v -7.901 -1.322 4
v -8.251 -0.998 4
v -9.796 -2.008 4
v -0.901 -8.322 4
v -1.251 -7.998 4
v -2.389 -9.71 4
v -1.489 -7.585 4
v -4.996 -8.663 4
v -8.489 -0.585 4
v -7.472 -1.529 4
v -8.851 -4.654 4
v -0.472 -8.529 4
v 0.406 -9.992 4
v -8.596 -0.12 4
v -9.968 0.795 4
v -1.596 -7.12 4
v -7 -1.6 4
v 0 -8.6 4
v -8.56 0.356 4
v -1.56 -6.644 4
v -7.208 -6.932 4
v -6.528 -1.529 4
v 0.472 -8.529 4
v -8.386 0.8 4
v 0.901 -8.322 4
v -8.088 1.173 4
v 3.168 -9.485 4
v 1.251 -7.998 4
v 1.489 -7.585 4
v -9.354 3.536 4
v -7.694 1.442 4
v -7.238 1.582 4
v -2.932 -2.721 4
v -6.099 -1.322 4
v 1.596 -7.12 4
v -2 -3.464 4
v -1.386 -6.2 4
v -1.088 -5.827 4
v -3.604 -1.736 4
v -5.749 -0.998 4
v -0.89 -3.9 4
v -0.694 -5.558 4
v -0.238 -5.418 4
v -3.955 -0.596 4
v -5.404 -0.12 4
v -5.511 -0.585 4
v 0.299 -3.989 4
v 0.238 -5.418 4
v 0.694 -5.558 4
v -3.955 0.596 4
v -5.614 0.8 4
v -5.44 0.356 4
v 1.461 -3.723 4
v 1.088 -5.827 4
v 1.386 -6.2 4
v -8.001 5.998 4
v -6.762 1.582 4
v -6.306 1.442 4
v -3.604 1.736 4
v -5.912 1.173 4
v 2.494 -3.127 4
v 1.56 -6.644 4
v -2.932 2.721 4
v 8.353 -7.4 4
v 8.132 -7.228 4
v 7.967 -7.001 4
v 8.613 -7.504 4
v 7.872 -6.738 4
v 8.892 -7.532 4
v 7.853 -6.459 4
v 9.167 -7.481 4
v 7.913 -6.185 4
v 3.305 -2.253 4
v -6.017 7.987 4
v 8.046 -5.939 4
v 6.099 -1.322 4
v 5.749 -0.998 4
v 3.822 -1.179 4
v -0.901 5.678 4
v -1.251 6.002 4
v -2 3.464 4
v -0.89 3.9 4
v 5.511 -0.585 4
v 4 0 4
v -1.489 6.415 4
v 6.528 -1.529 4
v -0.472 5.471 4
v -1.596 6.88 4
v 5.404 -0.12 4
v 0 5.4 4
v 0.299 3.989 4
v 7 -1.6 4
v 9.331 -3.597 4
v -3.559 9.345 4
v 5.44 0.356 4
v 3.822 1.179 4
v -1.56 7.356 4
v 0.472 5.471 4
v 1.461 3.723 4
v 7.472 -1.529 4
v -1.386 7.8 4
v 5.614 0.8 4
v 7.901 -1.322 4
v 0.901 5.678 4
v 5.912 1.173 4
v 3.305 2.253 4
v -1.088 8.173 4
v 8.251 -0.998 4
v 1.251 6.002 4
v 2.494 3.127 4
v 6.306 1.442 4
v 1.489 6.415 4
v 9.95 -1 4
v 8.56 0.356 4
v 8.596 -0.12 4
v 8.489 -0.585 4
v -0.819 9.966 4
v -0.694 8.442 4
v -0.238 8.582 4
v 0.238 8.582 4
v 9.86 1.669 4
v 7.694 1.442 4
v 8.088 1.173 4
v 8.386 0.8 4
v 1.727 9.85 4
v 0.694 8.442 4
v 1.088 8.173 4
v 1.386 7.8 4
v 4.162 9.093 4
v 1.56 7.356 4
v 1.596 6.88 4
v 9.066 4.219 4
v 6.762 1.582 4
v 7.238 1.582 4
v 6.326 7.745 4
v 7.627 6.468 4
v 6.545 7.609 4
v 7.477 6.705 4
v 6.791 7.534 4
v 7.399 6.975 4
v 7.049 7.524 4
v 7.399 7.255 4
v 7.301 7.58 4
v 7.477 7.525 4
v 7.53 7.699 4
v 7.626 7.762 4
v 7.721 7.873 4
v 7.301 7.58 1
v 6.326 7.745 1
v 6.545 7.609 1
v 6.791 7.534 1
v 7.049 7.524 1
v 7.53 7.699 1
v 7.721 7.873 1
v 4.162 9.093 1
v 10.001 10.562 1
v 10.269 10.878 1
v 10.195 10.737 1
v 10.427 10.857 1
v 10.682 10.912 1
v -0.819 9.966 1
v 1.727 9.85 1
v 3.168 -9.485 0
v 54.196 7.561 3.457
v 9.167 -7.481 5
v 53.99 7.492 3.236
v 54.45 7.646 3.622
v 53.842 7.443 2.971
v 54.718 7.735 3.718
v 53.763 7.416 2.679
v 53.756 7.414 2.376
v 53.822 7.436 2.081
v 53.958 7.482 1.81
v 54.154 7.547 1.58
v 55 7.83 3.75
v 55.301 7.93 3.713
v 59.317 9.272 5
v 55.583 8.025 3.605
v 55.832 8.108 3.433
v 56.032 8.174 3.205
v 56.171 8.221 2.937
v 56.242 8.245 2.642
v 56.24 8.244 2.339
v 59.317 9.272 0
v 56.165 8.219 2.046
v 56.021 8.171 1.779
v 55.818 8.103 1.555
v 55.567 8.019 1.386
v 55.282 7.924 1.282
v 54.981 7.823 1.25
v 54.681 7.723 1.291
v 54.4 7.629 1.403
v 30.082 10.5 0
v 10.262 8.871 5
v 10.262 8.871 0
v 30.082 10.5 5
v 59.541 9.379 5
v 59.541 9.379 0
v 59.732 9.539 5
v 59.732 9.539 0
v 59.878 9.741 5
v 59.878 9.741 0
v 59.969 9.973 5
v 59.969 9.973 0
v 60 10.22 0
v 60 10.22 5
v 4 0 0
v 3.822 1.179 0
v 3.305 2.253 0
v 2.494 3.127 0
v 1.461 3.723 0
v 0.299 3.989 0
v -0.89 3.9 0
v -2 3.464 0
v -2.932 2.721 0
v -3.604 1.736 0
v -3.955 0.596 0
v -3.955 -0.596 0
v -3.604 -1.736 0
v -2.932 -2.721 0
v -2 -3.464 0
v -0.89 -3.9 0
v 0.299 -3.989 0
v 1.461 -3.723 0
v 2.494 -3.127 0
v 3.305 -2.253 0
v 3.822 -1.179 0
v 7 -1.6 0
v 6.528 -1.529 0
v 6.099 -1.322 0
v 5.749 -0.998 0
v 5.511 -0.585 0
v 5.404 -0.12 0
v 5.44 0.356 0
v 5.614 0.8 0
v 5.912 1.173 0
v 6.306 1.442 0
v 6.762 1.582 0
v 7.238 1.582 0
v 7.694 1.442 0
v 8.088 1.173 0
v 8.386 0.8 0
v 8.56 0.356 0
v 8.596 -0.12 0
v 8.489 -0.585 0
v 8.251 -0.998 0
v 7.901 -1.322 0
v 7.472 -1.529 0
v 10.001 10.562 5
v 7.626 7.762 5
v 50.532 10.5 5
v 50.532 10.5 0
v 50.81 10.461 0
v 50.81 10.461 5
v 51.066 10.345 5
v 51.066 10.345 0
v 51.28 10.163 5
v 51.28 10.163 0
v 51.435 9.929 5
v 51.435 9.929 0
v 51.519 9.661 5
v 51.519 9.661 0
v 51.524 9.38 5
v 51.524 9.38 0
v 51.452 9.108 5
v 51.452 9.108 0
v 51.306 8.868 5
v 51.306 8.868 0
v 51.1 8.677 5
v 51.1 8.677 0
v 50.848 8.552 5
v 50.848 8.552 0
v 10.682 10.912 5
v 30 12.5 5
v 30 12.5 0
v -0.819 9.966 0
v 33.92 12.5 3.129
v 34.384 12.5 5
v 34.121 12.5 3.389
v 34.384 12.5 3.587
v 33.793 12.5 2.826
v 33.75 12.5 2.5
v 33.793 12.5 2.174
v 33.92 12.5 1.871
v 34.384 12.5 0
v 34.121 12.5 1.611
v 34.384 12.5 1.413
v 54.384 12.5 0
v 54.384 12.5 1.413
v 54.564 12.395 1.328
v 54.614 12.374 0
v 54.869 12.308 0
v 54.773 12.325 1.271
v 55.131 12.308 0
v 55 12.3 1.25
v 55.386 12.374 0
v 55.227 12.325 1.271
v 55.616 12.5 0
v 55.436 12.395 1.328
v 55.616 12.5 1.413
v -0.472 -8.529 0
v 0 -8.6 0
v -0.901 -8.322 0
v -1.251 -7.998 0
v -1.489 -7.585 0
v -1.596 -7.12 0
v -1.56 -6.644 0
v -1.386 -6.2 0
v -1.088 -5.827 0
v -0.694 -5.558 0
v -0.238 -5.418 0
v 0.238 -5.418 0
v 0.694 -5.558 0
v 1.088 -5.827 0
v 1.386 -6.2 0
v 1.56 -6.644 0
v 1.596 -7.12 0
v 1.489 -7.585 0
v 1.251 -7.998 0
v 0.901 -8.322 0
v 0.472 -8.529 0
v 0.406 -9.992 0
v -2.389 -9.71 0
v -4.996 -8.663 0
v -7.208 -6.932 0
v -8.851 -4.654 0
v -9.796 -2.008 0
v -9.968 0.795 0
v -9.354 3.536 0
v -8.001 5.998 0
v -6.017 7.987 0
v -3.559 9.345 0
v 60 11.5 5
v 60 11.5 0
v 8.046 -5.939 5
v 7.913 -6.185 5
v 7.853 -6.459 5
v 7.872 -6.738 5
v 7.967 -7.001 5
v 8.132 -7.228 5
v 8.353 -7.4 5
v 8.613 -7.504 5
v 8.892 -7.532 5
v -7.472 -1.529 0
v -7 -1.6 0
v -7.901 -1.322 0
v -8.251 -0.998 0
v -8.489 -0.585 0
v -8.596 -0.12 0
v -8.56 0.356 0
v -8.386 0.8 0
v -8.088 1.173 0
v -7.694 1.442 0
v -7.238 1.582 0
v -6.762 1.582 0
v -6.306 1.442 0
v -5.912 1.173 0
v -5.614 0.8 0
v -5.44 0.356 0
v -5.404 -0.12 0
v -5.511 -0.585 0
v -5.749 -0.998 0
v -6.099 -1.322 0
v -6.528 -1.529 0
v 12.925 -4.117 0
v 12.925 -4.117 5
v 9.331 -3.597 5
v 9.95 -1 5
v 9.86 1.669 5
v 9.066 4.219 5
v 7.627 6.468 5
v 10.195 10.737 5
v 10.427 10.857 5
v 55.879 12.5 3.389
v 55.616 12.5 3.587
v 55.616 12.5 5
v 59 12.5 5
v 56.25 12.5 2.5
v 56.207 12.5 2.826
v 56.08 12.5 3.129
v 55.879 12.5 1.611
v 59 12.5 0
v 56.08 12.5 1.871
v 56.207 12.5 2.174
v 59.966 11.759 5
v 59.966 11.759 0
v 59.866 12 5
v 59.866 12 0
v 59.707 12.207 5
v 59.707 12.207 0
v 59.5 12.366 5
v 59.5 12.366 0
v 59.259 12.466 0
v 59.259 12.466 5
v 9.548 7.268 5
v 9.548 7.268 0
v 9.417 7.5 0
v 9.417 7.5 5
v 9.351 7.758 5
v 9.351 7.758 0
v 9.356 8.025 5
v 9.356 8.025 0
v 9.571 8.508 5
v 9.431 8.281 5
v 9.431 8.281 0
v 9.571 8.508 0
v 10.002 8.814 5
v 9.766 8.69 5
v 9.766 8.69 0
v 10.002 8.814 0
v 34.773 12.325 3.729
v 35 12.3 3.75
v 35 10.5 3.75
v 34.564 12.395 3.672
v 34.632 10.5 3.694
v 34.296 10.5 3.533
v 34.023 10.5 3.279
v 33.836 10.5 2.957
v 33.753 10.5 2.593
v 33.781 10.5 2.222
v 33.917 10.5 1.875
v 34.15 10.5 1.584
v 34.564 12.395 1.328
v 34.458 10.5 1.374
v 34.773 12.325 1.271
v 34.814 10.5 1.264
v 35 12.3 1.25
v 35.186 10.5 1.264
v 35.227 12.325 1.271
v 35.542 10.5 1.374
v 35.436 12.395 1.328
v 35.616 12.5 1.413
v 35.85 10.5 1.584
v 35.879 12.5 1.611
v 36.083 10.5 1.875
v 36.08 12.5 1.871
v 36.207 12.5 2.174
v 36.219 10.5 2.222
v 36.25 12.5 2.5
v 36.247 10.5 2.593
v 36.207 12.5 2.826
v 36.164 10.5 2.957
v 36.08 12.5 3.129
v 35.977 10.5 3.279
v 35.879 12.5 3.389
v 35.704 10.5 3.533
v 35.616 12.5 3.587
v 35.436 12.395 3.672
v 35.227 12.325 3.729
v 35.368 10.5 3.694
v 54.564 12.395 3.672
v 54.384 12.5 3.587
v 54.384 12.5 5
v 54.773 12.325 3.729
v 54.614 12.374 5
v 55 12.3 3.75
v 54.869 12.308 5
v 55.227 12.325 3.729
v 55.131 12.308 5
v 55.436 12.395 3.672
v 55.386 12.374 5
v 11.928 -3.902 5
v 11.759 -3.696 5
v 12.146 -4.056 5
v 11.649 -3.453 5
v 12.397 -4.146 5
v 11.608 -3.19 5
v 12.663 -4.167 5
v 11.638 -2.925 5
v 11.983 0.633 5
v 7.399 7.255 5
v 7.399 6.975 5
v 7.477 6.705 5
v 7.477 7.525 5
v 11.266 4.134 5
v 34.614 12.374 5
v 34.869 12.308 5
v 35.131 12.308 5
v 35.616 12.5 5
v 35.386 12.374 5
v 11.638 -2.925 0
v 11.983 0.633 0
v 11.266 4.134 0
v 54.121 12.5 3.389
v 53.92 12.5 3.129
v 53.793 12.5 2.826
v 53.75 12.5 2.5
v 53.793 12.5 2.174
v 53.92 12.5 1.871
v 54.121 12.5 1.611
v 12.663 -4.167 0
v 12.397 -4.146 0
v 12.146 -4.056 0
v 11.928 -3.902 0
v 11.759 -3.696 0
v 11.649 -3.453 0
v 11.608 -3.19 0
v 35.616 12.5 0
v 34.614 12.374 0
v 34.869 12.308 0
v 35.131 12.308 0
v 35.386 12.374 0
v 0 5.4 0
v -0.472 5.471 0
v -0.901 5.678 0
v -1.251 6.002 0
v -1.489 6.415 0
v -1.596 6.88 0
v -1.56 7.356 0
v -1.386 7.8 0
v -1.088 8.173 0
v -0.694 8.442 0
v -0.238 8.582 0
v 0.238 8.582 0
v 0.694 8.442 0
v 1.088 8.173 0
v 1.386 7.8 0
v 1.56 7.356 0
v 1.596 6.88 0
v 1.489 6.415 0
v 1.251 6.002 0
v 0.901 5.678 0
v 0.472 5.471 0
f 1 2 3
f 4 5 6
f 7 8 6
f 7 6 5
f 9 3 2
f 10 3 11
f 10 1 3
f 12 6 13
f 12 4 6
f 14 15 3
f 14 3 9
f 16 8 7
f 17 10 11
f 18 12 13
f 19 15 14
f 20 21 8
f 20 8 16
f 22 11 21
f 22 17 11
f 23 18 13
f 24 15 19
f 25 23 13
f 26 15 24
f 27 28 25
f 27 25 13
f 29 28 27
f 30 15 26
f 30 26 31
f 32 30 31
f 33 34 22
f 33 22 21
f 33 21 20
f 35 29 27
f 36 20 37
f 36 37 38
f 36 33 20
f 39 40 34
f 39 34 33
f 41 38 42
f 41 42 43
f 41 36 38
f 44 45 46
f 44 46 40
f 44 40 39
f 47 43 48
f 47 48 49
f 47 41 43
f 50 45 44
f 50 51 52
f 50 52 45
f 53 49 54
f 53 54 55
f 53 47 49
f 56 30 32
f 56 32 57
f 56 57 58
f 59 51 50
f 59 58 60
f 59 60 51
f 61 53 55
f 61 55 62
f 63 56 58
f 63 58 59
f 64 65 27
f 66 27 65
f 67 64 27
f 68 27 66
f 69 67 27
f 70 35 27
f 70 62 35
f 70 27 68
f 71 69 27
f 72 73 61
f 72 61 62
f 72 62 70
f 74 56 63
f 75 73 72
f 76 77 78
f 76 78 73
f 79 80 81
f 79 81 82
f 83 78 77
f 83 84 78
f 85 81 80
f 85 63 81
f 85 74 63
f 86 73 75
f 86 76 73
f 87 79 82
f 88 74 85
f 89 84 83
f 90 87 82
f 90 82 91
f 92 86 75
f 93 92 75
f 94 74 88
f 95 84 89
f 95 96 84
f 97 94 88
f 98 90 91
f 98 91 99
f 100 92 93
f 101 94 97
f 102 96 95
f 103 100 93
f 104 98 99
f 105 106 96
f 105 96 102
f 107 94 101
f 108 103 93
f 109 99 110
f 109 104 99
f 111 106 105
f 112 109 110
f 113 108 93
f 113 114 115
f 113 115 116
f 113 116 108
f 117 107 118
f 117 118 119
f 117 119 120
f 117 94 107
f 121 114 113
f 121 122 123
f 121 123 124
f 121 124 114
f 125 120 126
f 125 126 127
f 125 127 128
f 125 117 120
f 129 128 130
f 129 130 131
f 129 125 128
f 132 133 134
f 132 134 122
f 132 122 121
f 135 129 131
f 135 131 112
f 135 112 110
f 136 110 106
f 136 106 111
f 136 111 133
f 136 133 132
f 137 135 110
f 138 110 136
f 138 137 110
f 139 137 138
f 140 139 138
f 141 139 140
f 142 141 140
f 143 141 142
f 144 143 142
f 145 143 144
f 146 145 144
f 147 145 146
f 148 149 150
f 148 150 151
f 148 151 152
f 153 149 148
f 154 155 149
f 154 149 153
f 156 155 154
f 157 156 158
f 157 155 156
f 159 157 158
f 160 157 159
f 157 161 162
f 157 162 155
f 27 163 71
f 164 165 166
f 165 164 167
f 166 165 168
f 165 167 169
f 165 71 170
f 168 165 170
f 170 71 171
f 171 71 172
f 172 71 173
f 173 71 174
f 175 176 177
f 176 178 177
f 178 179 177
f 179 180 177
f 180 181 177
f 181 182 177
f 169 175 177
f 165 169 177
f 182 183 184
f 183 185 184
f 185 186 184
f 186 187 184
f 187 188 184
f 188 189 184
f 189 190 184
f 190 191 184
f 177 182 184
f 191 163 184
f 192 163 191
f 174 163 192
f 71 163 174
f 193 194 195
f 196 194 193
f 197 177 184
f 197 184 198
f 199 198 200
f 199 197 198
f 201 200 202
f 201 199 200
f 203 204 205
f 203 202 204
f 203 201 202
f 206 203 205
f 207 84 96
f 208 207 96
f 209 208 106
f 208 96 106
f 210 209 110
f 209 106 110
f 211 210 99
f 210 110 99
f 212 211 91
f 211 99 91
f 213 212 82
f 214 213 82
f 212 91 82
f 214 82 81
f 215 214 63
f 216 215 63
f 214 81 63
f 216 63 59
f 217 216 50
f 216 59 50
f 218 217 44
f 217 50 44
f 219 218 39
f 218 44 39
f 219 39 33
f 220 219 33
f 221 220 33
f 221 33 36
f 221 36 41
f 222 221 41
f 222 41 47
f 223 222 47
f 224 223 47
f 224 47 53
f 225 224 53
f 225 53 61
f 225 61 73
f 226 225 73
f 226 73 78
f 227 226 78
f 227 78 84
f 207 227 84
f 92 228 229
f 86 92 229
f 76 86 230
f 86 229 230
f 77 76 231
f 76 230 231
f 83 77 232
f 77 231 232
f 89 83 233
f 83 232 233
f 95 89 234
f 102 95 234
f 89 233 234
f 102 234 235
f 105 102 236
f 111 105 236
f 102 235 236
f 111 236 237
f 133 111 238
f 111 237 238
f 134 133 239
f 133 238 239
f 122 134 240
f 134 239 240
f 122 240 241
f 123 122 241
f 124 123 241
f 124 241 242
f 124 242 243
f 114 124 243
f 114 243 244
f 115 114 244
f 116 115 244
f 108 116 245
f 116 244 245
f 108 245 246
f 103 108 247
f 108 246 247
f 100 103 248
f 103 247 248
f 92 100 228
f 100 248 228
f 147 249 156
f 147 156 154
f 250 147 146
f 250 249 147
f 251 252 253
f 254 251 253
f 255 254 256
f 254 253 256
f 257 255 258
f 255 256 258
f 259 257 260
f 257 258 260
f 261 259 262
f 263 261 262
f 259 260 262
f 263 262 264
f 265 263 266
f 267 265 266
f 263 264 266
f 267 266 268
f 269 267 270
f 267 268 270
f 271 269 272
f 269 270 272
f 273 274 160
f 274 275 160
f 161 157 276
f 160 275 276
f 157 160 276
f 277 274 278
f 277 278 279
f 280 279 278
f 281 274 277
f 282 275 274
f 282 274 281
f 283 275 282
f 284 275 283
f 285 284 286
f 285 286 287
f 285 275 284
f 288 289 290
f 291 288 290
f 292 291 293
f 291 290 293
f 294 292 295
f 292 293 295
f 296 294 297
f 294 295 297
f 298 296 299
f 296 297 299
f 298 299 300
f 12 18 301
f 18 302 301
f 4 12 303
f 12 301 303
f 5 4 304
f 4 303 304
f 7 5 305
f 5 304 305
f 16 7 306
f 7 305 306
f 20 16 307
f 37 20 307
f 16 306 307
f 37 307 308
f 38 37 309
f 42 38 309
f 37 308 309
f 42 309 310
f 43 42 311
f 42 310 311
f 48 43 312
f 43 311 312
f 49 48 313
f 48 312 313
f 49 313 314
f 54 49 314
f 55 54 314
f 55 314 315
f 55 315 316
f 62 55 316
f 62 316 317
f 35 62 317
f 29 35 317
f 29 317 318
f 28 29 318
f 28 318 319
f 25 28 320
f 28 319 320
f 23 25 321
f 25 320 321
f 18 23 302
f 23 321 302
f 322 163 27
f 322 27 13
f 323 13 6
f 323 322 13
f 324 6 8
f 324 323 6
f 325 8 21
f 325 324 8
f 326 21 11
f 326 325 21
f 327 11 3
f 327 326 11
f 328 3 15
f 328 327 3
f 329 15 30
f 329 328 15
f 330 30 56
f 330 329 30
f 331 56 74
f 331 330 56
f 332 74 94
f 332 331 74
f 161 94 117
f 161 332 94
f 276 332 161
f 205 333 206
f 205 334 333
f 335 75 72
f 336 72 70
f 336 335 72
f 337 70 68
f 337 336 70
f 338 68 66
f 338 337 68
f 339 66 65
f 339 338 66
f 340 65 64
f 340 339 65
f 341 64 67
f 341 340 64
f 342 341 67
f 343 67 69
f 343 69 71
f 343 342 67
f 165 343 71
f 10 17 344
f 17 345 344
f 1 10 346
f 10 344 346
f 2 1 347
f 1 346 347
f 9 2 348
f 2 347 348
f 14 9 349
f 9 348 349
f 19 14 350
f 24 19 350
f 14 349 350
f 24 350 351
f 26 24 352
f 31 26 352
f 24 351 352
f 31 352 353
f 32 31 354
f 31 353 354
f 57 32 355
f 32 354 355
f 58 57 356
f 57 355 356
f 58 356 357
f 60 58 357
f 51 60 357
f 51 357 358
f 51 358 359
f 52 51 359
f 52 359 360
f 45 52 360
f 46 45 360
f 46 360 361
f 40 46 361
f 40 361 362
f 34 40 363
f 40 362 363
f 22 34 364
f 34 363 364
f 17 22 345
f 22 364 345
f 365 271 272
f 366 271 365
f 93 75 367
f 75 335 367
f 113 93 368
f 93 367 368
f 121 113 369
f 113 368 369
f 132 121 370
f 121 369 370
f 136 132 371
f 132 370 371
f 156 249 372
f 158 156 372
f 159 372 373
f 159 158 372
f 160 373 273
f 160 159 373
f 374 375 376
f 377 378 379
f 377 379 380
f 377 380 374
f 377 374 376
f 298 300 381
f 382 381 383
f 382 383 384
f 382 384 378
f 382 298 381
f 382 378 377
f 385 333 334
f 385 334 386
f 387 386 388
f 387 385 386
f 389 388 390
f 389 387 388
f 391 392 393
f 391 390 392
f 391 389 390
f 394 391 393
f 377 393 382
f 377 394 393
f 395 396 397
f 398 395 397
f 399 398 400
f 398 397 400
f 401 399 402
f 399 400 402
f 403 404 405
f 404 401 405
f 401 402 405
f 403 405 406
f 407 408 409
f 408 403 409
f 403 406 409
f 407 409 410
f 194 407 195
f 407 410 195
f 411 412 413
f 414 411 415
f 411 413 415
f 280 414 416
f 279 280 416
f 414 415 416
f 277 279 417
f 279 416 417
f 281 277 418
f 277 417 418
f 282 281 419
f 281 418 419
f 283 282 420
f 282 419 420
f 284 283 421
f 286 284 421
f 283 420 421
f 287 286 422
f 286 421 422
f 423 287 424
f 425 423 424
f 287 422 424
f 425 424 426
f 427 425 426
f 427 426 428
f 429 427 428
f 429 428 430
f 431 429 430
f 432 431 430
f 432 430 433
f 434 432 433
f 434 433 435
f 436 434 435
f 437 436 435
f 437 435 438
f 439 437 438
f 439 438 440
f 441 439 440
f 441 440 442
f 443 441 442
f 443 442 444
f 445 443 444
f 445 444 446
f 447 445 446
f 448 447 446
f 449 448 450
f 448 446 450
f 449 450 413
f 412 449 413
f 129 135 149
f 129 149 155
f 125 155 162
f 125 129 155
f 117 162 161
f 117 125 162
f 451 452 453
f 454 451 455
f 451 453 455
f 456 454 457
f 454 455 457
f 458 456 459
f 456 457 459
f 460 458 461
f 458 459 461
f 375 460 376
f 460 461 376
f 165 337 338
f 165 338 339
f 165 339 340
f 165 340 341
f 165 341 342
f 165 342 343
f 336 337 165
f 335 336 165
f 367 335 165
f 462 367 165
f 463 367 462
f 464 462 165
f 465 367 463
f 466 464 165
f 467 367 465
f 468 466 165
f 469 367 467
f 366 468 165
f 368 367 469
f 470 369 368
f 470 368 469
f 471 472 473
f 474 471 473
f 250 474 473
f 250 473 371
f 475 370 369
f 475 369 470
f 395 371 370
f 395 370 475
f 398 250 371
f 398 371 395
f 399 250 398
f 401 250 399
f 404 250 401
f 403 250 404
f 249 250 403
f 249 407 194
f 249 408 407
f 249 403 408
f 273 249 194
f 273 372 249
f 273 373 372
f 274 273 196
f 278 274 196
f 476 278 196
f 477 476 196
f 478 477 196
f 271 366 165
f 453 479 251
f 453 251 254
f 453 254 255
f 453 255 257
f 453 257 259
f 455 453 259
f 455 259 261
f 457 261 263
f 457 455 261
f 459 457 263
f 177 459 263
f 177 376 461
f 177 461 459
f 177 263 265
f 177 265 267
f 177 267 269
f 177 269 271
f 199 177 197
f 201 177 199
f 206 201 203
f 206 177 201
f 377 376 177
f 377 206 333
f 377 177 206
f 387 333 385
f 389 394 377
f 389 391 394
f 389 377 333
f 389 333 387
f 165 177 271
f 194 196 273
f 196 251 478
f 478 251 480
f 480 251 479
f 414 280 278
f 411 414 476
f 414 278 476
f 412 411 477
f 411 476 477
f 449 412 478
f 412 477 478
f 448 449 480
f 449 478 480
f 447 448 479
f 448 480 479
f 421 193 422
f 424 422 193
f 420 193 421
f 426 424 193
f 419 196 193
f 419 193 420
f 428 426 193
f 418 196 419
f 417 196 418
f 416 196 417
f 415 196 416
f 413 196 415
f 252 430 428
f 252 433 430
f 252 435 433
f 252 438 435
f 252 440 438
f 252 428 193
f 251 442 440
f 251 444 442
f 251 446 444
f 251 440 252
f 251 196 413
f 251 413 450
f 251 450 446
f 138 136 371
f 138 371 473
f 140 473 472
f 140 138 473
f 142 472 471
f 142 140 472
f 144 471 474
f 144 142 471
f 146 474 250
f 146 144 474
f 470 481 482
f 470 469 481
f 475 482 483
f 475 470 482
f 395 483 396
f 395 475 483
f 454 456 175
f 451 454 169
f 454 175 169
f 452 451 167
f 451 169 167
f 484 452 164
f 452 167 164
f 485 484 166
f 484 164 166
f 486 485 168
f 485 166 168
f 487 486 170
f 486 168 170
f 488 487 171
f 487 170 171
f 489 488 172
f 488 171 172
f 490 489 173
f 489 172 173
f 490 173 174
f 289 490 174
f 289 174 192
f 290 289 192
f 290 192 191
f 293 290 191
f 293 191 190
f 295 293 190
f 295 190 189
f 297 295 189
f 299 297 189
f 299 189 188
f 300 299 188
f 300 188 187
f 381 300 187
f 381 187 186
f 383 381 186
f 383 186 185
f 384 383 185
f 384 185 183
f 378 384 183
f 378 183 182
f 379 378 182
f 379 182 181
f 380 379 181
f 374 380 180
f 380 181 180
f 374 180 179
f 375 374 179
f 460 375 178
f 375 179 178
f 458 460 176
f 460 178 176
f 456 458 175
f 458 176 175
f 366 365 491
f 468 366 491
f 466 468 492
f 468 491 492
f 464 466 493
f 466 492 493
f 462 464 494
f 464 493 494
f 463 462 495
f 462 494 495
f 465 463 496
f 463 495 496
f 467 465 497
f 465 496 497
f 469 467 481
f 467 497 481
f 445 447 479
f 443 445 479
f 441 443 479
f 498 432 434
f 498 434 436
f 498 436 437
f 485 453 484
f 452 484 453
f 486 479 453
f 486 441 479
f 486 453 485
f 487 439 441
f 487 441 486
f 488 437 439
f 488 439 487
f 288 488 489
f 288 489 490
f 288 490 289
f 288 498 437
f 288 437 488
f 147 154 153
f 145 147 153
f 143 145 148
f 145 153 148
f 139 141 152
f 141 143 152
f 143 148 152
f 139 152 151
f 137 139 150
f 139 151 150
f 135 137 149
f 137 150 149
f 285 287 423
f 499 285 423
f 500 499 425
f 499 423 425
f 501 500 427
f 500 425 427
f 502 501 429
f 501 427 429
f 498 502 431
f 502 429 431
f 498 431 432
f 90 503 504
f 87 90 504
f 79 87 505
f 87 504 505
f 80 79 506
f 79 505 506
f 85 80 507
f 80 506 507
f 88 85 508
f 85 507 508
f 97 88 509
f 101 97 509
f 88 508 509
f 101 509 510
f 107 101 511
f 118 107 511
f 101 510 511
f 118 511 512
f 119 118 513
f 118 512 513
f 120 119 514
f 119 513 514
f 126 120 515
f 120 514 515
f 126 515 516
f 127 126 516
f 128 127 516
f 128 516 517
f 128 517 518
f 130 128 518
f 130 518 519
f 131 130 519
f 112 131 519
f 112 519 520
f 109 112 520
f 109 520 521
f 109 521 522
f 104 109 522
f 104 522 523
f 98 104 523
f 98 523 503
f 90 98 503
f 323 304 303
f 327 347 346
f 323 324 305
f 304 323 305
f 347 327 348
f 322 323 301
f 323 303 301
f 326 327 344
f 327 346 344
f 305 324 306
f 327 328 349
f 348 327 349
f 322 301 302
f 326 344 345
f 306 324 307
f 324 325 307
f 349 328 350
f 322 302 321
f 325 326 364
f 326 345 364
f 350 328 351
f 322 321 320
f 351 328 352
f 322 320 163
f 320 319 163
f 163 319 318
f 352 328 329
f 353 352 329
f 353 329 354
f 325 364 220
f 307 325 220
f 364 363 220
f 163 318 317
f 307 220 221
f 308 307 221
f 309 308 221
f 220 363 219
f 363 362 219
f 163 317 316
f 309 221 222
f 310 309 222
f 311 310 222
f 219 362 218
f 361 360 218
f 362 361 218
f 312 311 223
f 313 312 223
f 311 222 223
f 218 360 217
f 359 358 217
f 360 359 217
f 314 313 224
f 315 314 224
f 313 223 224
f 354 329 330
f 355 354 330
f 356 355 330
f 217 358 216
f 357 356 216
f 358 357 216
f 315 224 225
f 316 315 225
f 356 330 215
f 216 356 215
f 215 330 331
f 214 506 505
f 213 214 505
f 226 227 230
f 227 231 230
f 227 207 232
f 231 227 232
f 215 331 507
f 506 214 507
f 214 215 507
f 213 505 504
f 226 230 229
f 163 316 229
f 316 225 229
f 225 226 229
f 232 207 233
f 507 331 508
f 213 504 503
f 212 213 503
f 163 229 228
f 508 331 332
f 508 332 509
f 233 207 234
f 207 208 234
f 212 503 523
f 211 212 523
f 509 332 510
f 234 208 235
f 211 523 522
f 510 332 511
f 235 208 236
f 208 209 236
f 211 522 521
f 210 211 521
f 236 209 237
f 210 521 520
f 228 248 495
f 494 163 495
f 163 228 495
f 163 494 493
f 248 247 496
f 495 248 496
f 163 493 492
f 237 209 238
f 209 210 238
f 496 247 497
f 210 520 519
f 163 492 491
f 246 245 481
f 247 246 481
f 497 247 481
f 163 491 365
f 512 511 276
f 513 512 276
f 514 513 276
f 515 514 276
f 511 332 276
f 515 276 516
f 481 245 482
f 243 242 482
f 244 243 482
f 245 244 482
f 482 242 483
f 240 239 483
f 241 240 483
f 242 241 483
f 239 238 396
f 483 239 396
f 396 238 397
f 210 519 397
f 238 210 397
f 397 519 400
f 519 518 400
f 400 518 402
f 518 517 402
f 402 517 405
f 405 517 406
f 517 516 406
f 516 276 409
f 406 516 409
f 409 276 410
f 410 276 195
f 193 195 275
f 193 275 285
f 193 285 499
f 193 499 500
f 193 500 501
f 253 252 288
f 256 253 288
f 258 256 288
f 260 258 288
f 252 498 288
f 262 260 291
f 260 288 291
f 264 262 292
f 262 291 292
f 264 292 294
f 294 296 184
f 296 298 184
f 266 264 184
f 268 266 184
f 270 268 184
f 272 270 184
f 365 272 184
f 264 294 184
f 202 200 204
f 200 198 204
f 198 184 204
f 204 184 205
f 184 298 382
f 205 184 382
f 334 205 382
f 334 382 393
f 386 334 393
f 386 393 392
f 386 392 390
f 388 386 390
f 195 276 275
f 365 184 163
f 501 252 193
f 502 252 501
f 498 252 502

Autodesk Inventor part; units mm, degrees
ref_plane "YZ Plane" through (0, 0, 0) normal (1, 0, 0) x (0, 1, 0)
ref_plane "XZ Plane" through (0, 0, 0) normal (0, 1, 0) x (-1, 0, 0)
ref_plane "XY Plane" through (0, 0, 0) normal (0, 0, 1) x (1, 0, 0)
sketch "スケッチ1" plane through (0, 0, 0) normal (0, 0, 1) x (1, 0, 0)
  circle A0 centre (0, 0) radius 10
  line L0 (30, 12.5) -> (60, 12.5)
  line L1 (60, 12.5) -> (60, 9.5)
  line L2 (60, 9.5) -> (30, 9.5)
  line L3 (30, 9.5) -> (30, 12.5)
  line L4 (30, 12.5) -> (-0.819325, 9.966379)
  line L5 (3.168424, -9.484782) -> (60, 9.5)
  dimension "d0" = 20
  dimension "d1" = 30
  dimension "d2" = 3
  dimension "d3" = 12.5
  dimension "d4" = 60
extrude "プレート1" add sketch "スケッチ1" along normal blind 5
sketch "スケッチ2" plane through (0, 0, 5) normal (0, 0, 1) x (1, 0, 0)
  arc A0 (-0.819325, 9.966379) -> (3.168424, -9.484782) centre (0, 0) ccw
  line L0 (30, 12.5) -> (-0.819325, 9.966379)
  circle A1 centre (0, 0) radius 10
  point P0 (3.168424, -9.484782)
extrude "押し出し1" cut sketch "スケッチ2" against normal blind 1
sketch "スケッチ3" plane through (0, 0, 4) normal (0, 0, 1) x (1, 0, 0)
  circle A0 centre (0, 0) radius 7 construction
  line L0 (0, -7) -> (7, 0) construction
  line L1 (7, 0) -> (0, 7) construction
  line L2 (0, 7) -> (-7, 0) construction
  line L3 (-7, 0) -> (0, -7) construction
  line L4 (0, -7) -> (0, 7) construction
  line L5 (7, 0) -> (-7, 0) construction
  dimension "d8" = 14
hole "穴1" at (0, 7, 4) at (7, 0, 4) at (0, -7, 4) at (-7, 0, 4) direction (0, 0, -1) diameter 3.2 end through all
sketch "スケッチ4" plane through (0, 0, 4) normal (0, 0, 1) x (1, 0, 0)
  circle A0 centre (0, 0) radius 4
  dimension "d16" = 8
extrude "押し出し2" cut sketch "スケッチ4" against normal through all
sketch "スケッチ6" plane through (0, 0, 5) normal (0, 0, 1) x (1, 0, 0)
  line L0 (60, 9.5) -> (3.168424, -9.484782)
  line L1 (60, 12.5) -> (60, 9.5)
  line L2 (30, 12.5) -> (60, 12.5)
  line L3 (-0.819325, 9.966379) -> (30, 12.5)
  arc A0 (3.168424, -9.484782) -> (-0.819325, 9.966379) centre (0, 0) ccw
  line L4 (30.08207, 10.5) -> (56.681246, 10.5)
  line L5 (56.681246, 10.5) -> (11.018186, -4.753901)
  arc A1 (11.018186, -4.753901) -> (8.258741, 8.705929) centre (0, 0) ccw
  line L6 (8.258741, 8.705929) -> (30.08207, 10.5)
  dimension "d28" = 2
extrude "押し出し4" cut sketch "スケッチ6" against normal through all contours L4 L5 A1 L6
sketch "スケッチ5" plane through (0, 0, 5) normal (0, 0, 1) x (1, 0, 0)
  line L0 (30, 12.5) -> (60, 12.5) projected
  circle A0 centre (35, 13.35) radius 1.05
  circle A1 centre (55, 13.35) radius 1.05
  line L1 (60, 12.5) -> (60, 9.5) projected
  point P0 (0, 0)
  dimension "d20" = 2.1
  dimension "d21" = 2.1
  dimension "d22" = 5
  dimension "d23" = 5
  dimension "d24" = 0.85
  dimension "d25" = 0.85
extrude "押し出し3" cut sketch "スケッチ5" against normal through all
fillet "フィレット2" radius 1 4 edges at (11.0182, -4.7539, 2.5) (8.2587, 8.7059, 2.5) (56.6812, 10.5, 2.5) (30.0821, 10.5, 2.5)
sketch "スケッチ7" plane through (35.616441, 12.5, 0) normal (0, 1, 0) x (1, 0, 0)
  line L0 (18.767117, -5) -> (18.767117, 0)
  line L1 (20, -5) -> (18.767117, -5)
  line L2 (20, 0) -> (20, -5)
  line L3 (18.767117, 0) -> (20, 0)
  line L4 (-1.232883, -5) -> (-1.232883, 0)
  line L5 (0, -5) -> (-1.232883, -5)
  line L6 (0, 0) -> (0, -5)
  line L7 (-1.232883, 0) -> (0, 0)
  point P0 (-35.616441, 0)
  point P1 (-0.616441, -2.5)
  point P2 (19.383559, -2.5)
  point P3 (19.383559, -5)
  point P4 (-0.616441, -5)
  point P5 (-1.232883, -2.5)
  point P6 (18.767117, -2.5)
hole "穴2" at (35, 12.5, 2.5) at (55, 12.5, 2.5) direction (0, -1, 0) diameter 2.5 depth 8 tip angle 118
fillet "フィレット3" radius 1 3 edges at (60, 9.5, 2.5) (60, 12.5, 2.5) (30, 12.5, 2.5)
sketch "スケッチ8" plane through (0, 0, 5) normal (0, 0, 1) x (1, 0, 0)
  arc A0 (3.168424, -9.484782) -> (-0.819325, 9.966379) centre (0, 0) ccw
  line L0 (-0.819325, 9.966379) -> (29.959103, 12.496638)
  line L1 (10.269293, 10.877961) -> (7.054657, 7.08744)
  arc A1 (10.262161, 8.870628) -> (9.548394, 7.268299) centre (10.344094, 7.87399) ccw
  dimension "d40" = 2
  dimension "d41" = 45
extrude "押し出し5" cut sketch "スケッチ8" against normal blind 4
fillet "フィレット4" radius 1 4 edges at (7.0547, 7.0874, 2.5) (7.0547, 7.0874, 4.5) (10.2693, 10.878, 3) (3.1684, -9.4848, 4.5)
equation "\"d14\" = Thickness"
equation "\"d23\" = d22"
equation "\"d25\" = d24"
equation "\"d5\" = Thickness"
equation "\"BendRadius\" = Thickness"
equation "\"BendReliefWidth\" = Thickness"
equation "\"BendReliefDepth\" = 0.5 * Thickness"
equation "\"TransitionRadius\" = BendRadius"
equation "\"JacobiRadiusSize\" = BendRadius"
equation "\"GapSize\" = Thickness"
equation "\"Thickness\" = 5"
properties part number "T5.0_club-face"
